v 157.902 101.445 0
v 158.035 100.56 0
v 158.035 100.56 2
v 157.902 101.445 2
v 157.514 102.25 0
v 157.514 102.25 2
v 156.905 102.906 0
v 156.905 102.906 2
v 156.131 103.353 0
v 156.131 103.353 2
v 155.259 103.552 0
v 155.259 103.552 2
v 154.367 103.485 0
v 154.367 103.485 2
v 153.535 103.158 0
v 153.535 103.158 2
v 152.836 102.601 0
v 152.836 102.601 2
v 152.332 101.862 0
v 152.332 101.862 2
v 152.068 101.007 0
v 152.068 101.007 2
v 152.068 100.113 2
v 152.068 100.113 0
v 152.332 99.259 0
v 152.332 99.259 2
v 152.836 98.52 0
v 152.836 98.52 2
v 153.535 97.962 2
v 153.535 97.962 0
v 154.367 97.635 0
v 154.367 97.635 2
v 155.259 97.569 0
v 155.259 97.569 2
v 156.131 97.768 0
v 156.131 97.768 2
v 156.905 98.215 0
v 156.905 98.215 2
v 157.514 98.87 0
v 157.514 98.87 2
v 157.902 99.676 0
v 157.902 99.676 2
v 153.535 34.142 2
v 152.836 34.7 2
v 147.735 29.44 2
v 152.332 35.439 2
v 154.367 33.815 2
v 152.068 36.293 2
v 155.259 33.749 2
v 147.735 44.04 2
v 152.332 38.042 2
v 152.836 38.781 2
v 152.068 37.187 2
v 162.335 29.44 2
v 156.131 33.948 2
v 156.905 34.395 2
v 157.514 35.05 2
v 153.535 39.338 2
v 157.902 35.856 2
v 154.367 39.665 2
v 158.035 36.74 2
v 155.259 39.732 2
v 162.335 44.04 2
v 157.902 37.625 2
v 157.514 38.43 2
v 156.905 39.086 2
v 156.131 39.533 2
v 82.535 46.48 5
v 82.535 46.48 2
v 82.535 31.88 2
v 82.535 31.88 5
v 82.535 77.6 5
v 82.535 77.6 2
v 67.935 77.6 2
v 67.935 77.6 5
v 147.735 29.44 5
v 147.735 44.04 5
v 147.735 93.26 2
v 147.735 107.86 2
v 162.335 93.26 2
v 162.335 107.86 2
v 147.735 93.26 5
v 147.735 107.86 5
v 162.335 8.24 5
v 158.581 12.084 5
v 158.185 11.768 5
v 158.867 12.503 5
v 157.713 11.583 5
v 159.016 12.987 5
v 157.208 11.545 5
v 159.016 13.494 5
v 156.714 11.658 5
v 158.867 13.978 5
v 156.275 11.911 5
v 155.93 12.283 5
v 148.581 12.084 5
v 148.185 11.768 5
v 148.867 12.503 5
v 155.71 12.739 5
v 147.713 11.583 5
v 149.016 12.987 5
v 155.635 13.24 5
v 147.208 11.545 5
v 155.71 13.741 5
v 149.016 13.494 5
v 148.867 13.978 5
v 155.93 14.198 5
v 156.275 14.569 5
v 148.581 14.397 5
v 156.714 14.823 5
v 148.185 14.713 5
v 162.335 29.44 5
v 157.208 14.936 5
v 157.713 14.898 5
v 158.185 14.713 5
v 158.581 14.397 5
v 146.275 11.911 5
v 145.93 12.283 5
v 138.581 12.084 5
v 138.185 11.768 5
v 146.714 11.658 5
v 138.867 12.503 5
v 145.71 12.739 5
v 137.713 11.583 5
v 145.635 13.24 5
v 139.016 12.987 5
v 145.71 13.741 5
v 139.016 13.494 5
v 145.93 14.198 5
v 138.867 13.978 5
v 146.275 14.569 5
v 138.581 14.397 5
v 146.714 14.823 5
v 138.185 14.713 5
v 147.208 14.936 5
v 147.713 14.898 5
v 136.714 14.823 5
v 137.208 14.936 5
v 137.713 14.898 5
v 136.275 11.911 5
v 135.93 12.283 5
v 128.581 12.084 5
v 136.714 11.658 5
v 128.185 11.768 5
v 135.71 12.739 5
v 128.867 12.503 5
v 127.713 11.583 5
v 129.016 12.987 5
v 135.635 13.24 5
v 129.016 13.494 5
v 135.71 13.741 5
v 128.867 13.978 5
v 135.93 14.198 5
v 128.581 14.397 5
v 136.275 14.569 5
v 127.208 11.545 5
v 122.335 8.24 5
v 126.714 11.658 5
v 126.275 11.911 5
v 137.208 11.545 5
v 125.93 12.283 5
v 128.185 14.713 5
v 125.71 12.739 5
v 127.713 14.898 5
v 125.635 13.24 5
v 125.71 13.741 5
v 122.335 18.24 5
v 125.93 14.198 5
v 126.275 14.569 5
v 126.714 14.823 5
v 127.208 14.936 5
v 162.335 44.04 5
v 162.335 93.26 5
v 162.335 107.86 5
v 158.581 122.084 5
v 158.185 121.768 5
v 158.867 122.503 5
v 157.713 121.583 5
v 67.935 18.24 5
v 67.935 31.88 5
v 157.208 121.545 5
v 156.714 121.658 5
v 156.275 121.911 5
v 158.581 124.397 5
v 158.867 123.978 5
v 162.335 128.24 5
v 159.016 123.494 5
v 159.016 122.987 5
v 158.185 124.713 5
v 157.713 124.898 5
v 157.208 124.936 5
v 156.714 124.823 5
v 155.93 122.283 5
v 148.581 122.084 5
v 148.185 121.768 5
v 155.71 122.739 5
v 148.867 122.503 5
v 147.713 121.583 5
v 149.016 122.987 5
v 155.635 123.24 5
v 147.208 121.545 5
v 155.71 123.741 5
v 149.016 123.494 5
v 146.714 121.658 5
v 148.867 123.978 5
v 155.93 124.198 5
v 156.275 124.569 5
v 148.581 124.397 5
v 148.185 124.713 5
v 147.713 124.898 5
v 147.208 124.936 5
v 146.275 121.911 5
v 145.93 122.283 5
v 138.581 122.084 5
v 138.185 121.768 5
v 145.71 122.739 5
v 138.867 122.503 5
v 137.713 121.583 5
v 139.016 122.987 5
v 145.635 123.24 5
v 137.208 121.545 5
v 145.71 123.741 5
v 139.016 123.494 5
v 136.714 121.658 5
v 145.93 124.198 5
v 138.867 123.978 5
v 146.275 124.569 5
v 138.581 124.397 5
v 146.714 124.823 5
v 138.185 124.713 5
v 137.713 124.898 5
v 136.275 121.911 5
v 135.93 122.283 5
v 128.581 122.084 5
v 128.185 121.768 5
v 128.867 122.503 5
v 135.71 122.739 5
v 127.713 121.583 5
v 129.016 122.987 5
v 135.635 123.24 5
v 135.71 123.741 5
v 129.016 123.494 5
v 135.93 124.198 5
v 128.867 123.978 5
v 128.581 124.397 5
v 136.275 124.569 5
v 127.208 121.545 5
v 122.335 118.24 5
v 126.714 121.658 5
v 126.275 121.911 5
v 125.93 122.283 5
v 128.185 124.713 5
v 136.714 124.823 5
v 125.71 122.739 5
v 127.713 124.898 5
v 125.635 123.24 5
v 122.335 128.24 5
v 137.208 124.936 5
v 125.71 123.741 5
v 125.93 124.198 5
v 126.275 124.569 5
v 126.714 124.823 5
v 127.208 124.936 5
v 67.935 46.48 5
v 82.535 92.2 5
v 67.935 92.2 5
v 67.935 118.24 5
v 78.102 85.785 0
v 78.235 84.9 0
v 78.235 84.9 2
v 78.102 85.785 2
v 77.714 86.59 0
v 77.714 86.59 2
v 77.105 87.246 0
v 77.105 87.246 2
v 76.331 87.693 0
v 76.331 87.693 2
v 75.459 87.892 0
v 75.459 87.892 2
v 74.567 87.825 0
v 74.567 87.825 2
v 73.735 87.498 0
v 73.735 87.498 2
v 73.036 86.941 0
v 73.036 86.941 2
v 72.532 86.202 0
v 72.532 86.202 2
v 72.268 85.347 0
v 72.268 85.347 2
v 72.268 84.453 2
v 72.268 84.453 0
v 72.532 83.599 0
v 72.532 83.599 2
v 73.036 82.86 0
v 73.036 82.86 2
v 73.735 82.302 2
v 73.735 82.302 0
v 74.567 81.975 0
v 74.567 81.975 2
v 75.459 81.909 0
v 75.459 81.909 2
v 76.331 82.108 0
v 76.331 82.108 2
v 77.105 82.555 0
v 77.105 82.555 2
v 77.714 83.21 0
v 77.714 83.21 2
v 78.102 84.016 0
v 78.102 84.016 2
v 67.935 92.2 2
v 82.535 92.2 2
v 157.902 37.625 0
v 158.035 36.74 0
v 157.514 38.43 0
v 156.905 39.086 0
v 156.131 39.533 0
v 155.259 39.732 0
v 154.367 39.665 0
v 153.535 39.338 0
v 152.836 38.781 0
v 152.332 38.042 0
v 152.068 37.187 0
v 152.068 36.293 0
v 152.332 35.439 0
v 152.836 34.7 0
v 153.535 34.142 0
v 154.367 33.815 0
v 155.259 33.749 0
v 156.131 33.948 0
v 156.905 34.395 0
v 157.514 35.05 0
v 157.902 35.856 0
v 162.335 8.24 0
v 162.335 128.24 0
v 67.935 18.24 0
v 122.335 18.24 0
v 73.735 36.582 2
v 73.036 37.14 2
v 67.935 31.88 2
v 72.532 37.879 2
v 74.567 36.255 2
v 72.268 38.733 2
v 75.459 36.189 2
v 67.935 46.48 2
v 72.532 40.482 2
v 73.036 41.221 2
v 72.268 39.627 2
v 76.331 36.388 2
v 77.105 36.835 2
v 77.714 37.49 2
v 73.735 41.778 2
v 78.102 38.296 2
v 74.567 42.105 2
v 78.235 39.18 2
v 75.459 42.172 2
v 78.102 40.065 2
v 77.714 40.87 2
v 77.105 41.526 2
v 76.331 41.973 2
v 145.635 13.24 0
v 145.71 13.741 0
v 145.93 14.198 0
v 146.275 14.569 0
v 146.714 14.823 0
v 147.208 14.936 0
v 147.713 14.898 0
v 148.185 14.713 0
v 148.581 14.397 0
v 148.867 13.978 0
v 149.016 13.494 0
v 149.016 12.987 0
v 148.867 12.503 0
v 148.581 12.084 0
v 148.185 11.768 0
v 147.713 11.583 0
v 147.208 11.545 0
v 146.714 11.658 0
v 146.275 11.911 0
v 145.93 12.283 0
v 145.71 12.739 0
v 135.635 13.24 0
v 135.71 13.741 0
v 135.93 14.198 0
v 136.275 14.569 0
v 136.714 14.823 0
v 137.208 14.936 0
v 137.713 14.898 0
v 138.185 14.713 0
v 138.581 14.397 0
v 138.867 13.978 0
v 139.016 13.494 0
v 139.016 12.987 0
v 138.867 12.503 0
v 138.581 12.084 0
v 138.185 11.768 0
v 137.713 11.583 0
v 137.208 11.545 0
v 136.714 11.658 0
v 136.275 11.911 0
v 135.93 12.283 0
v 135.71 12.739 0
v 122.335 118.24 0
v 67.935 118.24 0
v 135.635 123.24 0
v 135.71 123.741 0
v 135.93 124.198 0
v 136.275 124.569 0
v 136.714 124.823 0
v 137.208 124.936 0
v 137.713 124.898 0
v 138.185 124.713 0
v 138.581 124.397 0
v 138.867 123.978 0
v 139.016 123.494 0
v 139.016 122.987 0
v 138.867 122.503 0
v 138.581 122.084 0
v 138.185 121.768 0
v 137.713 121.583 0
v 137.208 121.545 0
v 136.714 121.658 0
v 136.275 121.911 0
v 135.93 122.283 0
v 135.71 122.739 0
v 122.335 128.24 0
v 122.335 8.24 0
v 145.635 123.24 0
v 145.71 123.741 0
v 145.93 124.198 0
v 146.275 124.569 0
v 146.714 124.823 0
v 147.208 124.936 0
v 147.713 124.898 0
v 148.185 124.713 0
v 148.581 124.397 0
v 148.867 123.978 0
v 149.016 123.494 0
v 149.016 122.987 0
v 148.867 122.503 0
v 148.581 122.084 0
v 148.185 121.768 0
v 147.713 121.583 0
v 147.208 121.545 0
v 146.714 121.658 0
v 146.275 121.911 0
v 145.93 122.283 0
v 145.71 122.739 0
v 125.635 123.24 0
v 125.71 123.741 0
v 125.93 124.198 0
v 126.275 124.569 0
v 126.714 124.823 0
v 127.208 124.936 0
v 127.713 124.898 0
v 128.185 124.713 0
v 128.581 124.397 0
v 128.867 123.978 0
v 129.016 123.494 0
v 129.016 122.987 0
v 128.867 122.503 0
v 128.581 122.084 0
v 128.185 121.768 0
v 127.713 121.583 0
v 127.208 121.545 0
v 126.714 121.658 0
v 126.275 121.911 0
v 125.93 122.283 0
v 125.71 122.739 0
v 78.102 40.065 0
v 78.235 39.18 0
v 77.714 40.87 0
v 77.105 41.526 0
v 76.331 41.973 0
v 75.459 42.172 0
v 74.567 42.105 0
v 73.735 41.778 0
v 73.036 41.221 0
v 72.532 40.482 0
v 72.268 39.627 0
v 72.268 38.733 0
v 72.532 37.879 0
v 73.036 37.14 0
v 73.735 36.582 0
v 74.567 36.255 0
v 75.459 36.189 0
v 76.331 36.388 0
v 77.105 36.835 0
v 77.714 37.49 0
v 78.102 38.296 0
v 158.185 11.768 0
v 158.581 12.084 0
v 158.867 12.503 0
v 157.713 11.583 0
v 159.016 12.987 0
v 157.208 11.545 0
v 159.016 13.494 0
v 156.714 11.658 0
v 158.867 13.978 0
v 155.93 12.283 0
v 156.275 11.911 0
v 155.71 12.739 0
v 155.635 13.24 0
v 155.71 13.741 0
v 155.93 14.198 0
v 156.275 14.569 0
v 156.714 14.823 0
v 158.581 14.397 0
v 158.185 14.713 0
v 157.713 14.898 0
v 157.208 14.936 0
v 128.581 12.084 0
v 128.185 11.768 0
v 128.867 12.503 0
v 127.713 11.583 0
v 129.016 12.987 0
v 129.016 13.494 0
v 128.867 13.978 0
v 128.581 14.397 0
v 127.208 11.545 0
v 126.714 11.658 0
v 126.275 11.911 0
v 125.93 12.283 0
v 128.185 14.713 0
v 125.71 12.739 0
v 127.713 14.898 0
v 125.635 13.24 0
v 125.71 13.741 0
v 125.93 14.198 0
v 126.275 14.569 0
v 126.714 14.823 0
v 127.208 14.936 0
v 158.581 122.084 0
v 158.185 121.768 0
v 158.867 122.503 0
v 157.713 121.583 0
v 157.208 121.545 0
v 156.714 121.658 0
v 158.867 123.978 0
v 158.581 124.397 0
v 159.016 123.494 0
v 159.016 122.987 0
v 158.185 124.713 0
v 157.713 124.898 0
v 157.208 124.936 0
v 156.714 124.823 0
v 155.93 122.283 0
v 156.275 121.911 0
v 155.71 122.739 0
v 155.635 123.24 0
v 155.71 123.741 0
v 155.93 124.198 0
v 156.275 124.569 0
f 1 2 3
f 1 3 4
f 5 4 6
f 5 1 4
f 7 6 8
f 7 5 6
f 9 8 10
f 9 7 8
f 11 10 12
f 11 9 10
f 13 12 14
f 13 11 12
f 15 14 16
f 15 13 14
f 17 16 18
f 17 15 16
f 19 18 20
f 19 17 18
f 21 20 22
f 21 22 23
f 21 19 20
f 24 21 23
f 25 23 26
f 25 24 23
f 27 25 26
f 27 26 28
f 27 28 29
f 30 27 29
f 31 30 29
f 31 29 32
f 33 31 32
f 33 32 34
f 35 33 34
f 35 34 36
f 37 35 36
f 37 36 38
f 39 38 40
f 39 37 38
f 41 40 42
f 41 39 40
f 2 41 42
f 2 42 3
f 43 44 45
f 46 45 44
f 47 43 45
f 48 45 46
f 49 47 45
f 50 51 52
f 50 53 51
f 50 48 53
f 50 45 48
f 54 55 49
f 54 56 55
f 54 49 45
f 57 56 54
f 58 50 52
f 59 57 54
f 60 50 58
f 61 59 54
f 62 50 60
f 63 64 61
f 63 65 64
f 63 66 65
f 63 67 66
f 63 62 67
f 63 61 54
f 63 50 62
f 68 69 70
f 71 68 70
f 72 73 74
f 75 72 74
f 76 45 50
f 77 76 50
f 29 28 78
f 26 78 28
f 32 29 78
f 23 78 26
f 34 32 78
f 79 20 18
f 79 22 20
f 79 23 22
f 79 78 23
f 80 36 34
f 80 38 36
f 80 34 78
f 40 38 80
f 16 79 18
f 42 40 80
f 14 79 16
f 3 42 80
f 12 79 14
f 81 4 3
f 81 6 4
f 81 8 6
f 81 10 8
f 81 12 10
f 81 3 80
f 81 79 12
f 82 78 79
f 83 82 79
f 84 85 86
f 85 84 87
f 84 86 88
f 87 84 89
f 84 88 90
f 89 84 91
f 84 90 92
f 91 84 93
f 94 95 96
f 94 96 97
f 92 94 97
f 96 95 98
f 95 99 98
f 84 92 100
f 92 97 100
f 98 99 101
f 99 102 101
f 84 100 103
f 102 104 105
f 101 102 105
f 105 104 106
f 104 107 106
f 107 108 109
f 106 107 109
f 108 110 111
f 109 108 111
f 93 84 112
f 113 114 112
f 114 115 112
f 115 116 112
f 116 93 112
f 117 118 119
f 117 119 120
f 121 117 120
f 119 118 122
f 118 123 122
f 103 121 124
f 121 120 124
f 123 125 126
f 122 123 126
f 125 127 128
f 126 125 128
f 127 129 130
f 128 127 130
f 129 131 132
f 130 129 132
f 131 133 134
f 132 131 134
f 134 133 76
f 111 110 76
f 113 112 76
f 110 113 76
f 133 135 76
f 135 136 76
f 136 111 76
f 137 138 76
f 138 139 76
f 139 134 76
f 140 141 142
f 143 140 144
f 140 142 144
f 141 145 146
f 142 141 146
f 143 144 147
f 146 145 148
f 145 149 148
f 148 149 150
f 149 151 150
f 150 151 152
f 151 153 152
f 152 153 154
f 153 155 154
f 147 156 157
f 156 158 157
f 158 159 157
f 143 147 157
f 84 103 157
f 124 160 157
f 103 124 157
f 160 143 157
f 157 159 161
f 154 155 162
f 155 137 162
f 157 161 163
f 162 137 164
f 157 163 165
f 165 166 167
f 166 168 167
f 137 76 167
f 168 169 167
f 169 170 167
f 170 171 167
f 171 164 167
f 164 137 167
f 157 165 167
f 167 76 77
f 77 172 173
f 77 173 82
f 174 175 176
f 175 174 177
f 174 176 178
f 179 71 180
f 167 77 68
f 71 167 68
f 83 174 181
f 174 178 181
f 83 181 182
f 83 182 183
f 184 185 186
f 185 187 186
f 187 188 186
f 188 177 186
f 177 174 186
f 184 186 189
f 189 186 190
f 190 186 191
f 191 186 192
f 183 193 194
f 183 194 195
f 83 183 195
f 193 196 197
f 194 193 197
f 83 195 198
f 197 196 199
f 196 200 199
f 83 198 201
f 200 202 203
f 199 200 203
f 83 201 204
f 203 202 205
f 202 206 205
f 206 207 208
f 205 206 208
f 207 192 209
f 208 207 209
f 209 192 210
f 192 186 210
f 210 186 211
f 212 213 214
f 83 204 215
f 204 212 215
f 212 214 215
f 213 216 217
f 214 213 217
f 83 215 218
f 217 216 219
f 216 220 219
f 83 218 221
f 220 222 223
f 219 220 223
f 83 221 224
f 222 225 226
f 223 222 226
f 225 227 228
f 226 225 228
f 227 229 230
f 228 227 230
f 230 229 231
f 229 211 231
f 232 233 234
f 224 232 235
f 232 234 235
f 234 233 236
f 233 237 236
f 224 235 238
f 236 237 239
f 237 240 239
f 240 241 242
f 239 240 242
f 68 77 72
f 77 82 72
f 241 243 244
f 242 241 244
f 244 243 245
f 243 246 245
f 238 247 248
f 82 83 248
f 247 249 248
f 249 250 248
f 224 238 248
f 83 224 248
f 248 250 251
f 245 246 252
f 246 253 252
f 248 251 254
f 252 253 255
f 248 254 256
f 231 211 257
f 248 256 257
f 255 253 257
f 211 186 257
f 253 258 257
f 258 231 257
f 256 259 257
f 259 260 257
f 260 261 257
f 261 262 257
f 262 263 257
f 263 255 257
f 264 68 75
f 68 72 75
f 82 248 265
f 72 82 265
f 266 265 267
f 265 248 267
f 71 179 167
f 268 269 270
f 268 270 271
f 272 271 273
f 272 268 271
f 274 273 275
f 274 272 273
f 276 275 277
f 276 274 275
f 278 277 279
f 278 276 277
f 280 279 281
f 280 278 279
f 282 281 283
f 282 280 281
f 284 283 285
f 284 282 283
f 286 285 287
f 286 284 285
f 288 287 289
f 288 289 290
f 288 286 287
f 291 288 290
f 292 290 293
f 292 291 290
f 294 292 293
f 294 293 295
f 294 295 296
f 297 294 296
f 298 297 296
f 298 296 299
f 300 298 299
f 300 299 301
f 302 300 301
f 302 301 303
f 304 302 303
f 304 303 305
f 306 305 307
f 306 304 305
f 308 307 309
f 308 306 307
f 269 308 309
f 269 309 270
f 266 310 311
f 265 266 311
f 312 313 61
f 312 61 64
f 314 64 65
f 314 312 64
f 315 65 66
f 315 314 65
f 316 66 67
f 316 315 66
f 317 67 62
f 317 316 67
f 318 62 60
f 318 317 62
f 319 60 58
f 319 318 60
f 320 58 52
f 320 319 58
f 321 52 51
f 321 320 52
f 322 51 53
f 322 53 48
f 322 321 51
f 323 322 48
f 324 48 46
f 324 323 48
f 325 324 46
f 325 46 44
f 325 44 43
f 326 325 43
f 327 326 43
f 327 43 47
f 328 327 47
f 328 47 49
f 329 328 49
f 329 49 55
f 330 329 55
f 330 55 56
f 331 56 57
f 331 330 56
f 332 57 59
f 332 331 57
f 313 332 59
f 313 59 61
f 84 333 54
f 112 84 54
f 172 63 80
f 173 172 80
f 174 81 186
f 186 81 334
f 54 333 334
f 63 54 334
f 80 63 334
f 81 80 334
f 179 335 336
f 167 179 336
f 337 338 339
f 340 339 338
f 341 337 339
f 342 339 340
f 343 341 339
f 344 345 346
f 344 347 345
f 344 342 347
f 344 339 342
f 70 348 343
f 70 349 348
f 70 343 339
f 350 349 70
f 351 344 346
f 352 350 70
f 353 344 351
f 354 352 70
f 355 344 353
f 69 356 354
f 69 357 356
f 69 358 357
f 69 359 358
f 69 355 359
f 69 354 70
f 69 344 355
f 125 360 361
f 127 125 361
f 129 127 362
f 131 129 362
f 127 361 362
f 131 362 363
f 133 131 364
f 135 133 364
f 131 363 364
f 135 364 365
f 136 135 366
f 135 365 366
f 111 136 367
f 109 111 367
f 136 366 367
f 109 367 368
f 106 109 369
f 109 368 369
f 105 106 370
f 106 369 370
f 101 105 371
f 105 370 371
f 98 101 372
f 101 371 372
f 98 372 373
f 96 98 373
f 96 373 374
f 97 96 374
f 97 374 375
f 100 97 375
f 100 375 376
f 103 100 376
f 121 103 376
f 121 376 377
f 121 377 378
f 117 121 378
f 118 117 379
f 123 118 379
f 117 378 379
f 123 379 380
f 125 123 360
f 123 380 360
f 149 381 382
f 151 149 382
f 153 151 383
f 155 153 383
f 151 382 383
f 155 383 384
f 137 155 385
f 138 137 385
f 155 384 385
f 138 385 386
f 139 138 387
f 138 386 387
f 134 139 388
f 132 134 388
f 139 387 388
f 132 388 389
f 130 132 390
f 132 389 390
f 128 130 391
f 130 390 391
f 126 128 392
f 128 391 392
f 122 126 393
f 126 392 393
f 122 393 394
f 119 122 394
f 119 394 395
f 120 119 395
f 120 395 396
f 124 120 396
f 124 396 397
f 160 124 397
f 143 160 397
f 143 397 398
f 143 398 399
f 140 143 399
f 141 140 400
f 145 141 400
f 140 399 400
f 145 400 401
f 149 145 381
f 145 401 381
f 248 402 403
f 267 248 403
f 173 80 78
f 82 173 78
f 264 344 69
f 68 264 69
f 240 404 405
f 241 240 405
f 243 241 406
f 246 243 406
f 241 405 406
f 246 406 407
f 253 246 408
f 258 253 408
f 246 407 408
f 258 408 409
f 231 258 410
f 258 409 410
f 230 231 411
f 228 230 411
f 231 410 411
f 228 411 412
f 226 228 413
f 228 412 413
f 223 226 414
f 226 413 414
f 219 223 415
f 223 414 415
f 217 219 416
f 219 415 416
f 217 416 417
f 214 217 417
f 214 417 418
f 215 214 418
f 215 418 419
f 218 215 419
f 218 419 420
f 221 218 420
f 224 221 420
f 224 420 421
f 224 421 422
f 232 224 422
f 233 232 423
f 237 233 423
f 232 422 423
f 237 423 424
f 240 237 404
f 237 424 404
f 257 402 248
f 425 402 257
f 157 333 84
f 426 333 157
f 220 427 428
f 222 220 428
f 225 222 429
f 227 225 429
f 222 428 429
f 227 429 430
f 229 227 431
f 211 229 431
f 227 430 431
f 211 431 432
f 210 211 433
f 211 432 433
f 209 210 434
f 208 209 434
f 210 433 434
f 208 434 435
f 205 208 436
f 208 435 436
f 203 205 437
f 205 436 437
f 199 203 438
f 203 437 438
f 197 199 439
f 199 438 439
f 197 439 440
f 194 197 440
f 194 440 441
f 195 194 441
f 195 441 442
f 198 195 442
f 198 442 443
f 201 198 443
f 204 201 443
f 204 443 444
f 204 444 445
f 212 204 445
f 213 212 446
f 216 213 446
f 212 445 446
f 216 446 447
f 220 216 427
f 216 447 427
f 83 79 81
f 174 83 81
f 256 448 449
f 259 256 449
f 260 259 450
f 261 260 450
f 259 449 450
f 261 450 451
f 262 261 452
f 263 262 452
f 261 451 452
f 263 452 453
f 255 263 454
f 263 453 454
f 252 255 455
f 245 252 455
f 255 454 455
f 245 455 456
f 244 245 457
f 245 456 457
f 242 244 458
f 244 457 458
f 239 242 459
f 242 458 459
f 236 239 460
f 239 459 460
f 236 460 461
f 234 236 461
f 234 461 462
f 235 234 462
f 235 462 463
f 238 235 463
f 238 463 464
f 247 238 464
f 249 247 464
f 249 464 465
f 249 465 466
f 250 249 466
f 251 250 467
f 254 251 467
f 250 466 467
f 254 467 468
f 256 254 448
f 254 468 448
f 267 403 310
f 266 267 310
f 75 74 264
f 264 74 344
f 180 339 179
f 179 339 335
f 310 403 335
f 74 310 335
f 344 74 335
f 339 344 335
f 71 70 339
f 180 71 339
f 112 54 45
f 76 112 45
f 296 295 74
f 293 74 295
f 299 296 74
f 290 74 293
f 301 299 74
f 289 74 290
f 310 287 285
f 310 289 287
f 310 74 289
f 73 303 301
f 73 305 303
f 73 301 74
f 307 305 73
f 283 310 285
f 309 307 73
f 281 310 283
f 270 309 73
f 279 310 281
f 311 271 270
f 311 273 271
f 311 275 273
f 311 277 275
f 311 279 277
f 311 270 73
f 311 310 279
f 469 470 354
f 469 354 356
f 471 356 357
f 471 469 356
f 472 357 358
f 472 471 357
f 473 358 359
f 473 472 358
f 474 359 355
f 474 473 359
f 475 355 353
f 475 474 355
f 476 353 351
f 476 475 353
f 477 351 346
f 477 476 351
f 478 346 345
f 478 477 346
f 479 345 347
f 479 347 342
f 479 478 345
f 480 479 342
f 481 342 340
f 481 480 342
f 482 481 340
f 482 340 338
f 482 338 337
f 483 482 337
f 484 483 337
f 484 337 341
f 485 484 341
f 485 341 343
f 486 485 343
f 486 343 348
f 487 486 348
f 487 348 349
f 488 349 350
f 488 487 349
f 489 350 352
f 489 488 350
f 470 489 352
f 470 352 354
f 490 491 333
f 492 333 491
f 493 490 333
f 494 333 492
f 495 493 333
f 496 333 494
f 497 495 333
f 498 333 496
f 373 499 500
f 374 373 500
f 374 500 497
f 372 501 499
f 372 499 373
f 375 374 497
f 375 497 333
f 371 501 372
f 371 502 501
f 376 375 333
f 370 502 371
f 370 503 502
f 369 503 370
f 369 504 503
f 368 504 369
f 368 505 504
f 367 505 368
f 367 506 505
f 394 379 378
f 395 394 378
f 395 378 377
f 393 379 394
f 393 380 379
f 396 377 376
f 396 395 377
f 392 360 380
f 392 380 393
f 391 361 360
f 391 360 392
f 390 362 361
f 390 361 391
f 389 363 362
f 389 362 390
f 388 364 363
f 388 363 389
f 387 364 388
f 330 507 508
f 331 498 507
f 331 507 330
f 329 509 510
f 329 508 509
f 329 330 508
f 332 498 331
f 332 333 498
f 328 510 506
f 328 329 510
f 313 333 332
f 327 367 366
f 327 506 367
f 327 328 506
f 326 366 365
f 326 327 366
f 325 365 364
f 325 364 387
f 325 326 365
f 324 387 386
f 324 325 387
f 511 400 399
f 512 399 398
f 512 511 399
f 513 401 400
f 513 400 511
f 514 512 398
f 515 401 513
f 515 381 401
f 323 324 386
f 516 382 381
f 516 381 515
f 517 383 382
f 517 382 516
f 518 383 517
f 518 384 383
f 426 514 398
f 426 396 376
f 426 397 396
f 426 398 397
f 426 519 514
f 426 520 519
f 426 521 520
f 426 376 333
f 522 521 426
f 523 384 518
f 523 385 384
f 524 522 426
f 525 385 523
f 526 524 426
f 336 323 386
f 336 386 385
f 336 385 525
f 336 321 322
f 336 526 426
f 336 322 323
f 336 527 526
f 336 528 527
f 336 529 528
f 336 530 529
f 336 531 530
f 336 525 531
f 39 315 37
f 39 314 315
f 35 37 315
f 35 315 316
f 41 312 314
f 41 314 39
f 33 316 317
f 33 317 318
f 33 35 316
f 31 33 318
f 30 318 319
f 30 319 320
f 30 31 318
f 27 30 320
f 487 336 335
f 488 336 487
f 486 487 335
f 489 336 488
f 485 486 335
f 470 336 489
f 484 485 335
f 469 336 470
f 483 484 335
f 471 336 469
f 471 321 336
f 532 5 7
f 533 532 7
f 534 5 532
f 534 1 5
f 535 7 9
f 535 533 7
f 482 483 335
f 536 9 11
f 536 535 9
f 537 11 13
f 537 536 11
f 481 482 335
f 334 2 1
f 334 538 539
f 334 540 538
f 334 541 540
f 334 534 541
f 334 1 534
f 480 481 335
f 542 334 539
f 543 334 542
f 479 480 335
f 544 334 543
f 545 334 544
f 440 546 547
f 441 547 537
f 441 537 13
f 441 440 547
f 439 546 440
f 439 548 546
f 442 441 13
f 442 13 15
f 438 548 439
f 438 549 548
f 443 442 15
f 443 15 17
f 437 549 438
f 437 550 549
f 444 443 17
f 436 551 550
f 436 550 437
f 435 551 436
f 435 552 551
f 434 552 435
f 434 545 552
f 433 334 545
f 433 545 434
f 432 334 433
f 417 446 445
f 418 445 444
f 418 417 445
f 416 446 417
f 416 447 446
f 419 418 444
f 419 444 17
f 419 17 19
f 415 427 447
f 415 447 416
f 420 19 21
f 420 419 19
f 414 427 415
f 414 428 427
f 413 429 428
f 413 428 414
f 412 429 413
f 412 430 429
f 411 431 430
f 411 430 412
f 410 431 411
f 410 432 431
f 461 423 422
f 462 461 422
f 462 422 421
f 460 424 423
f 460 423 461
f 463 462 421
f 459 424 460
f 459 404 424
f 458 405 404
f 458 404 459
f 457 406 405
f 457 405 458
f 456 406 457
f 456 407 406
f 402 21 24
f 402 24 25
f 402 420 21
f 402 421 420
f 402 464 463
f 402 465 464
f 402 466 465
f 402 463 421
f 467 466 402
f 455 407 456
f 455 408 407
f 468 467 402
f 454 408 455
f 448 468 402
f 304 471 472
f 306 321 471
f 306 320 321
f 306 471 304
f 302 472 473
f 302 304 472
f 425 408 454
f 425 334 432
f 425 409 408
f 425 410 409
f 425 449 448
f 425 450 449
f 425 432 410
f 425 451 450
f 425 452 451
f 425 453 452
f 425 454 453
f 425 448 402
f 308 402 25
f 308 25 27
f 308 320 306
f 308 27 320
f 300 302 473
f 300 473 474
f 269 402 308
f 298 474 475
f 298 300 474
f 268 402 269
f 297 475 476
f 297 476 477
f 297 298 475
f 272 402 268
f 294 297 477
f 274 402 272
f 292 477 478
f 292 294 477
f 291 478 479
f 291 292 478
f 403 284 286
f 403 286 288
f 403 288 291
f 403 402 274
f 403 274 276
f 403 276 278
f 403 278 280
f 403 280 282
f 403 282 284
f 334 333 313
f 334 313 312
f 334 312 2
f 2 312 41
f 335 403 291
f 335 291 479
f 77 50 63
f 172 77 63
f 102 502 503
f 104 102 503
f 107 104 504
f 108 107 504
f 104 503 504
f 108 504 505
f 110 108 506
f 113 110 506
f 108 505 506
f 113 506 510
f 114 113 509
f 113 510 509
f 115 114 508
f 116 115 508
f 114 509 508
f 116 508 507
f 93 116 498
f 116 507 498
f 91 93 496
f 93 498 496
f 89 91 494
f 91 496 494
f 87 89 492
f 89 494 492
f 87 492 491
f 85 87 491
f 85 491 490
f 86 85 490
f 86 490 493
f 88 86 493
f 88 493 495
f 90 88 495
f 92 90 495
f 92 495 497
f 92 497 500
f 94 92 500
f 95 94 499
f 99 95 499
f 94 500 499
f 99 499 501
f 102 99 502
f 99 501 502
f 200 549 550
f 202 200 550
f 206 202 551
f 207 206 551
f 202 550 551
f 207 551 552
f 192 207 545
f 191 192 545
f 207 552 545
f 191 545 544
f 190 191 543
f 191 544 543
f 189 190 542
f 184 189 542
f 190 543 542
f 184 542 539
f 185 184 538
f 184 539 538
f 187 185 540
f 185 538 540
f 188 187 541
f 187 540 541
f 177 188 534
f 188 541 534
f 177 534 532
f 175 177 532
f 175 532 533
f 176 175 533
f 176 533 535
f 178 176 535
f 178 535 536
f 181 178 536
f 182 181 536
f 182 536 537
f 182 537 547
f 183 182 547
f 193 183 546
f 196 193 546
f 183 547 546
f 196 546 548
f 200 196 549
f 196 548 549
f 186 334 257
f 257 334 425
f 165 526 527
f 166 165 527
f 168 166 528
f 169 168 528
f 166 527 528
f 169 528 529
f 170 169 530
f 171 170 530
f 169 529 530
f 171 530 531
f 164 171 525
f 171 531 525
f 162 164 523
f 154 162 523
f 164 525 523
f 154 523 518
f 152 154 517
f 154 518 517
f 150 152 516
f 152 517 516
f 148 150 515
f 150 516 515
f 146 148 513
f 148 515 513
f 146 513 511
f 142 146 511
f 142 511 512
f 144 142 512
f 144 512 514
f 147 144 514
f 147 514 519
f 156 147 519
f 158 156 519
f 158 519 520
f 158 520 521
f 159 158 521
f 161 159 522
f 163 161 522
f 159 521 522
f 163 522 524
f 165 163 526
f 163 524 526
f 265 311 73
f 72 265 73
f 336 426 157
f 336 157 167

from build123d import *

# Parameters (mm, degrees)
SKETCH2_W           = 92
SKETCH2_H           = 100
SKETCH2_R           = 3
SKETCH2_W_2         = 2.4
BOSS_EXTRUDE1_DEPTH = 2
BOSS_EXTRUDE3_DEPTH = 3
SKETCH5_W           = 40
SKETCH5_H           = 10
SKETCH5_R           = 1.7
BOSS_EXTRUDE4_DEPTH = 5


with BuildPart() as part:
    # Sketch2 → Boss-Extrude1 (new body)
    # profile 1 of 2: a face of its own
    with BuildSketch(Plane.XY):
        with Locations((113.934873736, 68.240270394)):
            Rectangle(SKETCH2_W, SKETCH2_H)
        with Locations((75.234873736, 39.180270394)):
            Circle(SKETCH2_R, mode=Mode.SUBTRACT)
        with Locations((155.034873736, 36.740270394)):
            Circle(SKETCH2_R, mode=Mode.SUBTRACT)
        with Locations((75.234873736, 84.900270394)):
            Circle(SKETCH2_R, mode=Mode.SUBTRACT)
        with Locations((155.034873736, 100.560270394)):
            Circle(SKETCH2_R, mode=Mode.SUBTRACT)
    # profile 2 of 2: a face of its own
    with BuildSketch(Plane.XY):
        with Locations((161.134873736, 68.240270394)):
            Rectangle(SKETCH2_W_2, SKETCH2_H)
    extrude(amount=BOSS_EXTRUDE1_DEPTH)

    # Sketch3 → Boss-Extrude3 (add)
    with BuildSketch(Plane.XY.offset(2)):
        Polygon((82.534873736, 77.600270394), (67.934873736, 77.600270394), (67.934873736, 46.480270394), (82.534873736, 46.480270394), (82.534873736, 31.880270394), (67.934873736, 31.880270394), (67.934873736, 18.240270394), (162.334873736, 18.240270394), (162.334873736, 29.440270394), (147.734873736, 29.440270394), (147.734873736, 44.040270394), (162.334873736, 44.040270394), (162.334873736, 93.260270394), (147.734873736, 93.260270394), (147.734873736, 107.860270394), (162.334873736, 107.860270394), (162.334873736, 118.240270394), (67.934873736, 118.240270394), (67.934873736, 92.200270394), (82.534873736, 92.200270394), align=None)
    extrude(amount=BOSS_EXTRUDE3_DEPTH)

    # Sketch5 → Boss-Extrude4 (add)
    # profile 1 of 2: a face of its own
    with BuildSketch(Plane(origin=(0, 0, 0), x_dir=(-1, 0, 0), z_dir=(0, 0, -1))):
        with Locations((-142.334873736, 123.240270394)):
            Rectangle(SKETCH5_W, SKETCH5_H)
        with Locations((-157.334873736, 123.240270394)):
            Circle(SKETCH5_R, mode=Mode.SUBTRACT)
        with Locations((-147.334873736, 123.240270394)):
            Circle(SKETCH5_R, mode=Mode.SUBTRACT)
        with Locations((-137.334873736, 123.240270394)):
            Circle(SKETCH5_R, mode=Mode.SUBTRACT)
        with Locations((-127.334873736, 123.240270394)):
            Circle(SKETCH5_R, mode=Mode.SUBTRACT)
    # profile 2 of 2: a face of its own
    with BuildSketch(Plane(origin=(0, 0, 0), x_dir=(-1, 0, 0), z_dir=(0, 0, -1))):
        with Locations((-142.334873736, 13.240270394)):
            Rectangle(SKETCH5_W, SKETCH5_H)
        with Locations((-157.334873736, 13.240270394)):
            Circle(SKETCH5_R, mode=Mode.SUBTRACT)
        with Locations((-147.334873736, 13.240270394)):
            Circle(SKETCH5_R, mode=Mode.SUBTRACT)
        with Locations((-137.334873736, 13.240270394)):
            Circle(SKETCH5_R, mode=Mode.SUBTRACT)
        with Locations((-127.334873736, 13.240270394)):
            Circle(SKETCH5_R, mode=Mode.SUBTRACT)
    extrude(amount=-BOSS_EXTRUDE4_DEPTH)


solid = part.part
